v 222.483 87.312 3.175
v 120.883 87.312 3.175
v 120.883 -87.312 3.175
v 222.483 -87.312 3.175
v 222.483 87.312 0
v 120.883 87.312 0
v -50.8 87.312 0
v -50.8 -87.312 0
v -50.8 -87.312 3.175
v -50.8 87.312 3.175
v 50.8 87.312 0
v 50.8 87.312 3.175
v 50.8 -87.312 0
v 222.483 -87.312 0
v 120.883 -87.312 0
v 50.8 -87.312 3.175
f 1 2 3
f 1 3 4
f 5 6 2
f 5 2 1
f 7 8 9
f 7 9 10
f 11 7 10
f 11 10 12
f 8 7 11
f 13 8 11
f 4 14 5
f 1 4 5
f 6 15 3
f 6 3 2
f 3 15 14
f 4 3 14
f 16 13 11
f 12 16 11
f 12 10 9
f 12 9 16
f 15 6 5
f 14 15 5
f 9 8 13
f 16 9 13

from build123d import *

# Parameters (mm, degrees)
F0_W     = 101.6
F0_H     = 174.625
F1_DEPTH = 3.175
F2_DEPTH = 3.175


with BuildPart() as f1:
    # F0 (on Top) → F1 (new body)
    with BuildSketch(Plane.XY):
        Rectangle(F0_W, F0_H)
    extrude(amount=F1_DEPTH)


with BuildPart() as f2:
    # F0 (on Top) → F2 (new body)
    with BuildSketch(Plane.XY):
        with Locations((171.682522, 0)):
            Rectangle(F0_W, F0_H)
    extrude(amount=F2_DEPTH)


solid = Compound([f1.part, f2.part])
